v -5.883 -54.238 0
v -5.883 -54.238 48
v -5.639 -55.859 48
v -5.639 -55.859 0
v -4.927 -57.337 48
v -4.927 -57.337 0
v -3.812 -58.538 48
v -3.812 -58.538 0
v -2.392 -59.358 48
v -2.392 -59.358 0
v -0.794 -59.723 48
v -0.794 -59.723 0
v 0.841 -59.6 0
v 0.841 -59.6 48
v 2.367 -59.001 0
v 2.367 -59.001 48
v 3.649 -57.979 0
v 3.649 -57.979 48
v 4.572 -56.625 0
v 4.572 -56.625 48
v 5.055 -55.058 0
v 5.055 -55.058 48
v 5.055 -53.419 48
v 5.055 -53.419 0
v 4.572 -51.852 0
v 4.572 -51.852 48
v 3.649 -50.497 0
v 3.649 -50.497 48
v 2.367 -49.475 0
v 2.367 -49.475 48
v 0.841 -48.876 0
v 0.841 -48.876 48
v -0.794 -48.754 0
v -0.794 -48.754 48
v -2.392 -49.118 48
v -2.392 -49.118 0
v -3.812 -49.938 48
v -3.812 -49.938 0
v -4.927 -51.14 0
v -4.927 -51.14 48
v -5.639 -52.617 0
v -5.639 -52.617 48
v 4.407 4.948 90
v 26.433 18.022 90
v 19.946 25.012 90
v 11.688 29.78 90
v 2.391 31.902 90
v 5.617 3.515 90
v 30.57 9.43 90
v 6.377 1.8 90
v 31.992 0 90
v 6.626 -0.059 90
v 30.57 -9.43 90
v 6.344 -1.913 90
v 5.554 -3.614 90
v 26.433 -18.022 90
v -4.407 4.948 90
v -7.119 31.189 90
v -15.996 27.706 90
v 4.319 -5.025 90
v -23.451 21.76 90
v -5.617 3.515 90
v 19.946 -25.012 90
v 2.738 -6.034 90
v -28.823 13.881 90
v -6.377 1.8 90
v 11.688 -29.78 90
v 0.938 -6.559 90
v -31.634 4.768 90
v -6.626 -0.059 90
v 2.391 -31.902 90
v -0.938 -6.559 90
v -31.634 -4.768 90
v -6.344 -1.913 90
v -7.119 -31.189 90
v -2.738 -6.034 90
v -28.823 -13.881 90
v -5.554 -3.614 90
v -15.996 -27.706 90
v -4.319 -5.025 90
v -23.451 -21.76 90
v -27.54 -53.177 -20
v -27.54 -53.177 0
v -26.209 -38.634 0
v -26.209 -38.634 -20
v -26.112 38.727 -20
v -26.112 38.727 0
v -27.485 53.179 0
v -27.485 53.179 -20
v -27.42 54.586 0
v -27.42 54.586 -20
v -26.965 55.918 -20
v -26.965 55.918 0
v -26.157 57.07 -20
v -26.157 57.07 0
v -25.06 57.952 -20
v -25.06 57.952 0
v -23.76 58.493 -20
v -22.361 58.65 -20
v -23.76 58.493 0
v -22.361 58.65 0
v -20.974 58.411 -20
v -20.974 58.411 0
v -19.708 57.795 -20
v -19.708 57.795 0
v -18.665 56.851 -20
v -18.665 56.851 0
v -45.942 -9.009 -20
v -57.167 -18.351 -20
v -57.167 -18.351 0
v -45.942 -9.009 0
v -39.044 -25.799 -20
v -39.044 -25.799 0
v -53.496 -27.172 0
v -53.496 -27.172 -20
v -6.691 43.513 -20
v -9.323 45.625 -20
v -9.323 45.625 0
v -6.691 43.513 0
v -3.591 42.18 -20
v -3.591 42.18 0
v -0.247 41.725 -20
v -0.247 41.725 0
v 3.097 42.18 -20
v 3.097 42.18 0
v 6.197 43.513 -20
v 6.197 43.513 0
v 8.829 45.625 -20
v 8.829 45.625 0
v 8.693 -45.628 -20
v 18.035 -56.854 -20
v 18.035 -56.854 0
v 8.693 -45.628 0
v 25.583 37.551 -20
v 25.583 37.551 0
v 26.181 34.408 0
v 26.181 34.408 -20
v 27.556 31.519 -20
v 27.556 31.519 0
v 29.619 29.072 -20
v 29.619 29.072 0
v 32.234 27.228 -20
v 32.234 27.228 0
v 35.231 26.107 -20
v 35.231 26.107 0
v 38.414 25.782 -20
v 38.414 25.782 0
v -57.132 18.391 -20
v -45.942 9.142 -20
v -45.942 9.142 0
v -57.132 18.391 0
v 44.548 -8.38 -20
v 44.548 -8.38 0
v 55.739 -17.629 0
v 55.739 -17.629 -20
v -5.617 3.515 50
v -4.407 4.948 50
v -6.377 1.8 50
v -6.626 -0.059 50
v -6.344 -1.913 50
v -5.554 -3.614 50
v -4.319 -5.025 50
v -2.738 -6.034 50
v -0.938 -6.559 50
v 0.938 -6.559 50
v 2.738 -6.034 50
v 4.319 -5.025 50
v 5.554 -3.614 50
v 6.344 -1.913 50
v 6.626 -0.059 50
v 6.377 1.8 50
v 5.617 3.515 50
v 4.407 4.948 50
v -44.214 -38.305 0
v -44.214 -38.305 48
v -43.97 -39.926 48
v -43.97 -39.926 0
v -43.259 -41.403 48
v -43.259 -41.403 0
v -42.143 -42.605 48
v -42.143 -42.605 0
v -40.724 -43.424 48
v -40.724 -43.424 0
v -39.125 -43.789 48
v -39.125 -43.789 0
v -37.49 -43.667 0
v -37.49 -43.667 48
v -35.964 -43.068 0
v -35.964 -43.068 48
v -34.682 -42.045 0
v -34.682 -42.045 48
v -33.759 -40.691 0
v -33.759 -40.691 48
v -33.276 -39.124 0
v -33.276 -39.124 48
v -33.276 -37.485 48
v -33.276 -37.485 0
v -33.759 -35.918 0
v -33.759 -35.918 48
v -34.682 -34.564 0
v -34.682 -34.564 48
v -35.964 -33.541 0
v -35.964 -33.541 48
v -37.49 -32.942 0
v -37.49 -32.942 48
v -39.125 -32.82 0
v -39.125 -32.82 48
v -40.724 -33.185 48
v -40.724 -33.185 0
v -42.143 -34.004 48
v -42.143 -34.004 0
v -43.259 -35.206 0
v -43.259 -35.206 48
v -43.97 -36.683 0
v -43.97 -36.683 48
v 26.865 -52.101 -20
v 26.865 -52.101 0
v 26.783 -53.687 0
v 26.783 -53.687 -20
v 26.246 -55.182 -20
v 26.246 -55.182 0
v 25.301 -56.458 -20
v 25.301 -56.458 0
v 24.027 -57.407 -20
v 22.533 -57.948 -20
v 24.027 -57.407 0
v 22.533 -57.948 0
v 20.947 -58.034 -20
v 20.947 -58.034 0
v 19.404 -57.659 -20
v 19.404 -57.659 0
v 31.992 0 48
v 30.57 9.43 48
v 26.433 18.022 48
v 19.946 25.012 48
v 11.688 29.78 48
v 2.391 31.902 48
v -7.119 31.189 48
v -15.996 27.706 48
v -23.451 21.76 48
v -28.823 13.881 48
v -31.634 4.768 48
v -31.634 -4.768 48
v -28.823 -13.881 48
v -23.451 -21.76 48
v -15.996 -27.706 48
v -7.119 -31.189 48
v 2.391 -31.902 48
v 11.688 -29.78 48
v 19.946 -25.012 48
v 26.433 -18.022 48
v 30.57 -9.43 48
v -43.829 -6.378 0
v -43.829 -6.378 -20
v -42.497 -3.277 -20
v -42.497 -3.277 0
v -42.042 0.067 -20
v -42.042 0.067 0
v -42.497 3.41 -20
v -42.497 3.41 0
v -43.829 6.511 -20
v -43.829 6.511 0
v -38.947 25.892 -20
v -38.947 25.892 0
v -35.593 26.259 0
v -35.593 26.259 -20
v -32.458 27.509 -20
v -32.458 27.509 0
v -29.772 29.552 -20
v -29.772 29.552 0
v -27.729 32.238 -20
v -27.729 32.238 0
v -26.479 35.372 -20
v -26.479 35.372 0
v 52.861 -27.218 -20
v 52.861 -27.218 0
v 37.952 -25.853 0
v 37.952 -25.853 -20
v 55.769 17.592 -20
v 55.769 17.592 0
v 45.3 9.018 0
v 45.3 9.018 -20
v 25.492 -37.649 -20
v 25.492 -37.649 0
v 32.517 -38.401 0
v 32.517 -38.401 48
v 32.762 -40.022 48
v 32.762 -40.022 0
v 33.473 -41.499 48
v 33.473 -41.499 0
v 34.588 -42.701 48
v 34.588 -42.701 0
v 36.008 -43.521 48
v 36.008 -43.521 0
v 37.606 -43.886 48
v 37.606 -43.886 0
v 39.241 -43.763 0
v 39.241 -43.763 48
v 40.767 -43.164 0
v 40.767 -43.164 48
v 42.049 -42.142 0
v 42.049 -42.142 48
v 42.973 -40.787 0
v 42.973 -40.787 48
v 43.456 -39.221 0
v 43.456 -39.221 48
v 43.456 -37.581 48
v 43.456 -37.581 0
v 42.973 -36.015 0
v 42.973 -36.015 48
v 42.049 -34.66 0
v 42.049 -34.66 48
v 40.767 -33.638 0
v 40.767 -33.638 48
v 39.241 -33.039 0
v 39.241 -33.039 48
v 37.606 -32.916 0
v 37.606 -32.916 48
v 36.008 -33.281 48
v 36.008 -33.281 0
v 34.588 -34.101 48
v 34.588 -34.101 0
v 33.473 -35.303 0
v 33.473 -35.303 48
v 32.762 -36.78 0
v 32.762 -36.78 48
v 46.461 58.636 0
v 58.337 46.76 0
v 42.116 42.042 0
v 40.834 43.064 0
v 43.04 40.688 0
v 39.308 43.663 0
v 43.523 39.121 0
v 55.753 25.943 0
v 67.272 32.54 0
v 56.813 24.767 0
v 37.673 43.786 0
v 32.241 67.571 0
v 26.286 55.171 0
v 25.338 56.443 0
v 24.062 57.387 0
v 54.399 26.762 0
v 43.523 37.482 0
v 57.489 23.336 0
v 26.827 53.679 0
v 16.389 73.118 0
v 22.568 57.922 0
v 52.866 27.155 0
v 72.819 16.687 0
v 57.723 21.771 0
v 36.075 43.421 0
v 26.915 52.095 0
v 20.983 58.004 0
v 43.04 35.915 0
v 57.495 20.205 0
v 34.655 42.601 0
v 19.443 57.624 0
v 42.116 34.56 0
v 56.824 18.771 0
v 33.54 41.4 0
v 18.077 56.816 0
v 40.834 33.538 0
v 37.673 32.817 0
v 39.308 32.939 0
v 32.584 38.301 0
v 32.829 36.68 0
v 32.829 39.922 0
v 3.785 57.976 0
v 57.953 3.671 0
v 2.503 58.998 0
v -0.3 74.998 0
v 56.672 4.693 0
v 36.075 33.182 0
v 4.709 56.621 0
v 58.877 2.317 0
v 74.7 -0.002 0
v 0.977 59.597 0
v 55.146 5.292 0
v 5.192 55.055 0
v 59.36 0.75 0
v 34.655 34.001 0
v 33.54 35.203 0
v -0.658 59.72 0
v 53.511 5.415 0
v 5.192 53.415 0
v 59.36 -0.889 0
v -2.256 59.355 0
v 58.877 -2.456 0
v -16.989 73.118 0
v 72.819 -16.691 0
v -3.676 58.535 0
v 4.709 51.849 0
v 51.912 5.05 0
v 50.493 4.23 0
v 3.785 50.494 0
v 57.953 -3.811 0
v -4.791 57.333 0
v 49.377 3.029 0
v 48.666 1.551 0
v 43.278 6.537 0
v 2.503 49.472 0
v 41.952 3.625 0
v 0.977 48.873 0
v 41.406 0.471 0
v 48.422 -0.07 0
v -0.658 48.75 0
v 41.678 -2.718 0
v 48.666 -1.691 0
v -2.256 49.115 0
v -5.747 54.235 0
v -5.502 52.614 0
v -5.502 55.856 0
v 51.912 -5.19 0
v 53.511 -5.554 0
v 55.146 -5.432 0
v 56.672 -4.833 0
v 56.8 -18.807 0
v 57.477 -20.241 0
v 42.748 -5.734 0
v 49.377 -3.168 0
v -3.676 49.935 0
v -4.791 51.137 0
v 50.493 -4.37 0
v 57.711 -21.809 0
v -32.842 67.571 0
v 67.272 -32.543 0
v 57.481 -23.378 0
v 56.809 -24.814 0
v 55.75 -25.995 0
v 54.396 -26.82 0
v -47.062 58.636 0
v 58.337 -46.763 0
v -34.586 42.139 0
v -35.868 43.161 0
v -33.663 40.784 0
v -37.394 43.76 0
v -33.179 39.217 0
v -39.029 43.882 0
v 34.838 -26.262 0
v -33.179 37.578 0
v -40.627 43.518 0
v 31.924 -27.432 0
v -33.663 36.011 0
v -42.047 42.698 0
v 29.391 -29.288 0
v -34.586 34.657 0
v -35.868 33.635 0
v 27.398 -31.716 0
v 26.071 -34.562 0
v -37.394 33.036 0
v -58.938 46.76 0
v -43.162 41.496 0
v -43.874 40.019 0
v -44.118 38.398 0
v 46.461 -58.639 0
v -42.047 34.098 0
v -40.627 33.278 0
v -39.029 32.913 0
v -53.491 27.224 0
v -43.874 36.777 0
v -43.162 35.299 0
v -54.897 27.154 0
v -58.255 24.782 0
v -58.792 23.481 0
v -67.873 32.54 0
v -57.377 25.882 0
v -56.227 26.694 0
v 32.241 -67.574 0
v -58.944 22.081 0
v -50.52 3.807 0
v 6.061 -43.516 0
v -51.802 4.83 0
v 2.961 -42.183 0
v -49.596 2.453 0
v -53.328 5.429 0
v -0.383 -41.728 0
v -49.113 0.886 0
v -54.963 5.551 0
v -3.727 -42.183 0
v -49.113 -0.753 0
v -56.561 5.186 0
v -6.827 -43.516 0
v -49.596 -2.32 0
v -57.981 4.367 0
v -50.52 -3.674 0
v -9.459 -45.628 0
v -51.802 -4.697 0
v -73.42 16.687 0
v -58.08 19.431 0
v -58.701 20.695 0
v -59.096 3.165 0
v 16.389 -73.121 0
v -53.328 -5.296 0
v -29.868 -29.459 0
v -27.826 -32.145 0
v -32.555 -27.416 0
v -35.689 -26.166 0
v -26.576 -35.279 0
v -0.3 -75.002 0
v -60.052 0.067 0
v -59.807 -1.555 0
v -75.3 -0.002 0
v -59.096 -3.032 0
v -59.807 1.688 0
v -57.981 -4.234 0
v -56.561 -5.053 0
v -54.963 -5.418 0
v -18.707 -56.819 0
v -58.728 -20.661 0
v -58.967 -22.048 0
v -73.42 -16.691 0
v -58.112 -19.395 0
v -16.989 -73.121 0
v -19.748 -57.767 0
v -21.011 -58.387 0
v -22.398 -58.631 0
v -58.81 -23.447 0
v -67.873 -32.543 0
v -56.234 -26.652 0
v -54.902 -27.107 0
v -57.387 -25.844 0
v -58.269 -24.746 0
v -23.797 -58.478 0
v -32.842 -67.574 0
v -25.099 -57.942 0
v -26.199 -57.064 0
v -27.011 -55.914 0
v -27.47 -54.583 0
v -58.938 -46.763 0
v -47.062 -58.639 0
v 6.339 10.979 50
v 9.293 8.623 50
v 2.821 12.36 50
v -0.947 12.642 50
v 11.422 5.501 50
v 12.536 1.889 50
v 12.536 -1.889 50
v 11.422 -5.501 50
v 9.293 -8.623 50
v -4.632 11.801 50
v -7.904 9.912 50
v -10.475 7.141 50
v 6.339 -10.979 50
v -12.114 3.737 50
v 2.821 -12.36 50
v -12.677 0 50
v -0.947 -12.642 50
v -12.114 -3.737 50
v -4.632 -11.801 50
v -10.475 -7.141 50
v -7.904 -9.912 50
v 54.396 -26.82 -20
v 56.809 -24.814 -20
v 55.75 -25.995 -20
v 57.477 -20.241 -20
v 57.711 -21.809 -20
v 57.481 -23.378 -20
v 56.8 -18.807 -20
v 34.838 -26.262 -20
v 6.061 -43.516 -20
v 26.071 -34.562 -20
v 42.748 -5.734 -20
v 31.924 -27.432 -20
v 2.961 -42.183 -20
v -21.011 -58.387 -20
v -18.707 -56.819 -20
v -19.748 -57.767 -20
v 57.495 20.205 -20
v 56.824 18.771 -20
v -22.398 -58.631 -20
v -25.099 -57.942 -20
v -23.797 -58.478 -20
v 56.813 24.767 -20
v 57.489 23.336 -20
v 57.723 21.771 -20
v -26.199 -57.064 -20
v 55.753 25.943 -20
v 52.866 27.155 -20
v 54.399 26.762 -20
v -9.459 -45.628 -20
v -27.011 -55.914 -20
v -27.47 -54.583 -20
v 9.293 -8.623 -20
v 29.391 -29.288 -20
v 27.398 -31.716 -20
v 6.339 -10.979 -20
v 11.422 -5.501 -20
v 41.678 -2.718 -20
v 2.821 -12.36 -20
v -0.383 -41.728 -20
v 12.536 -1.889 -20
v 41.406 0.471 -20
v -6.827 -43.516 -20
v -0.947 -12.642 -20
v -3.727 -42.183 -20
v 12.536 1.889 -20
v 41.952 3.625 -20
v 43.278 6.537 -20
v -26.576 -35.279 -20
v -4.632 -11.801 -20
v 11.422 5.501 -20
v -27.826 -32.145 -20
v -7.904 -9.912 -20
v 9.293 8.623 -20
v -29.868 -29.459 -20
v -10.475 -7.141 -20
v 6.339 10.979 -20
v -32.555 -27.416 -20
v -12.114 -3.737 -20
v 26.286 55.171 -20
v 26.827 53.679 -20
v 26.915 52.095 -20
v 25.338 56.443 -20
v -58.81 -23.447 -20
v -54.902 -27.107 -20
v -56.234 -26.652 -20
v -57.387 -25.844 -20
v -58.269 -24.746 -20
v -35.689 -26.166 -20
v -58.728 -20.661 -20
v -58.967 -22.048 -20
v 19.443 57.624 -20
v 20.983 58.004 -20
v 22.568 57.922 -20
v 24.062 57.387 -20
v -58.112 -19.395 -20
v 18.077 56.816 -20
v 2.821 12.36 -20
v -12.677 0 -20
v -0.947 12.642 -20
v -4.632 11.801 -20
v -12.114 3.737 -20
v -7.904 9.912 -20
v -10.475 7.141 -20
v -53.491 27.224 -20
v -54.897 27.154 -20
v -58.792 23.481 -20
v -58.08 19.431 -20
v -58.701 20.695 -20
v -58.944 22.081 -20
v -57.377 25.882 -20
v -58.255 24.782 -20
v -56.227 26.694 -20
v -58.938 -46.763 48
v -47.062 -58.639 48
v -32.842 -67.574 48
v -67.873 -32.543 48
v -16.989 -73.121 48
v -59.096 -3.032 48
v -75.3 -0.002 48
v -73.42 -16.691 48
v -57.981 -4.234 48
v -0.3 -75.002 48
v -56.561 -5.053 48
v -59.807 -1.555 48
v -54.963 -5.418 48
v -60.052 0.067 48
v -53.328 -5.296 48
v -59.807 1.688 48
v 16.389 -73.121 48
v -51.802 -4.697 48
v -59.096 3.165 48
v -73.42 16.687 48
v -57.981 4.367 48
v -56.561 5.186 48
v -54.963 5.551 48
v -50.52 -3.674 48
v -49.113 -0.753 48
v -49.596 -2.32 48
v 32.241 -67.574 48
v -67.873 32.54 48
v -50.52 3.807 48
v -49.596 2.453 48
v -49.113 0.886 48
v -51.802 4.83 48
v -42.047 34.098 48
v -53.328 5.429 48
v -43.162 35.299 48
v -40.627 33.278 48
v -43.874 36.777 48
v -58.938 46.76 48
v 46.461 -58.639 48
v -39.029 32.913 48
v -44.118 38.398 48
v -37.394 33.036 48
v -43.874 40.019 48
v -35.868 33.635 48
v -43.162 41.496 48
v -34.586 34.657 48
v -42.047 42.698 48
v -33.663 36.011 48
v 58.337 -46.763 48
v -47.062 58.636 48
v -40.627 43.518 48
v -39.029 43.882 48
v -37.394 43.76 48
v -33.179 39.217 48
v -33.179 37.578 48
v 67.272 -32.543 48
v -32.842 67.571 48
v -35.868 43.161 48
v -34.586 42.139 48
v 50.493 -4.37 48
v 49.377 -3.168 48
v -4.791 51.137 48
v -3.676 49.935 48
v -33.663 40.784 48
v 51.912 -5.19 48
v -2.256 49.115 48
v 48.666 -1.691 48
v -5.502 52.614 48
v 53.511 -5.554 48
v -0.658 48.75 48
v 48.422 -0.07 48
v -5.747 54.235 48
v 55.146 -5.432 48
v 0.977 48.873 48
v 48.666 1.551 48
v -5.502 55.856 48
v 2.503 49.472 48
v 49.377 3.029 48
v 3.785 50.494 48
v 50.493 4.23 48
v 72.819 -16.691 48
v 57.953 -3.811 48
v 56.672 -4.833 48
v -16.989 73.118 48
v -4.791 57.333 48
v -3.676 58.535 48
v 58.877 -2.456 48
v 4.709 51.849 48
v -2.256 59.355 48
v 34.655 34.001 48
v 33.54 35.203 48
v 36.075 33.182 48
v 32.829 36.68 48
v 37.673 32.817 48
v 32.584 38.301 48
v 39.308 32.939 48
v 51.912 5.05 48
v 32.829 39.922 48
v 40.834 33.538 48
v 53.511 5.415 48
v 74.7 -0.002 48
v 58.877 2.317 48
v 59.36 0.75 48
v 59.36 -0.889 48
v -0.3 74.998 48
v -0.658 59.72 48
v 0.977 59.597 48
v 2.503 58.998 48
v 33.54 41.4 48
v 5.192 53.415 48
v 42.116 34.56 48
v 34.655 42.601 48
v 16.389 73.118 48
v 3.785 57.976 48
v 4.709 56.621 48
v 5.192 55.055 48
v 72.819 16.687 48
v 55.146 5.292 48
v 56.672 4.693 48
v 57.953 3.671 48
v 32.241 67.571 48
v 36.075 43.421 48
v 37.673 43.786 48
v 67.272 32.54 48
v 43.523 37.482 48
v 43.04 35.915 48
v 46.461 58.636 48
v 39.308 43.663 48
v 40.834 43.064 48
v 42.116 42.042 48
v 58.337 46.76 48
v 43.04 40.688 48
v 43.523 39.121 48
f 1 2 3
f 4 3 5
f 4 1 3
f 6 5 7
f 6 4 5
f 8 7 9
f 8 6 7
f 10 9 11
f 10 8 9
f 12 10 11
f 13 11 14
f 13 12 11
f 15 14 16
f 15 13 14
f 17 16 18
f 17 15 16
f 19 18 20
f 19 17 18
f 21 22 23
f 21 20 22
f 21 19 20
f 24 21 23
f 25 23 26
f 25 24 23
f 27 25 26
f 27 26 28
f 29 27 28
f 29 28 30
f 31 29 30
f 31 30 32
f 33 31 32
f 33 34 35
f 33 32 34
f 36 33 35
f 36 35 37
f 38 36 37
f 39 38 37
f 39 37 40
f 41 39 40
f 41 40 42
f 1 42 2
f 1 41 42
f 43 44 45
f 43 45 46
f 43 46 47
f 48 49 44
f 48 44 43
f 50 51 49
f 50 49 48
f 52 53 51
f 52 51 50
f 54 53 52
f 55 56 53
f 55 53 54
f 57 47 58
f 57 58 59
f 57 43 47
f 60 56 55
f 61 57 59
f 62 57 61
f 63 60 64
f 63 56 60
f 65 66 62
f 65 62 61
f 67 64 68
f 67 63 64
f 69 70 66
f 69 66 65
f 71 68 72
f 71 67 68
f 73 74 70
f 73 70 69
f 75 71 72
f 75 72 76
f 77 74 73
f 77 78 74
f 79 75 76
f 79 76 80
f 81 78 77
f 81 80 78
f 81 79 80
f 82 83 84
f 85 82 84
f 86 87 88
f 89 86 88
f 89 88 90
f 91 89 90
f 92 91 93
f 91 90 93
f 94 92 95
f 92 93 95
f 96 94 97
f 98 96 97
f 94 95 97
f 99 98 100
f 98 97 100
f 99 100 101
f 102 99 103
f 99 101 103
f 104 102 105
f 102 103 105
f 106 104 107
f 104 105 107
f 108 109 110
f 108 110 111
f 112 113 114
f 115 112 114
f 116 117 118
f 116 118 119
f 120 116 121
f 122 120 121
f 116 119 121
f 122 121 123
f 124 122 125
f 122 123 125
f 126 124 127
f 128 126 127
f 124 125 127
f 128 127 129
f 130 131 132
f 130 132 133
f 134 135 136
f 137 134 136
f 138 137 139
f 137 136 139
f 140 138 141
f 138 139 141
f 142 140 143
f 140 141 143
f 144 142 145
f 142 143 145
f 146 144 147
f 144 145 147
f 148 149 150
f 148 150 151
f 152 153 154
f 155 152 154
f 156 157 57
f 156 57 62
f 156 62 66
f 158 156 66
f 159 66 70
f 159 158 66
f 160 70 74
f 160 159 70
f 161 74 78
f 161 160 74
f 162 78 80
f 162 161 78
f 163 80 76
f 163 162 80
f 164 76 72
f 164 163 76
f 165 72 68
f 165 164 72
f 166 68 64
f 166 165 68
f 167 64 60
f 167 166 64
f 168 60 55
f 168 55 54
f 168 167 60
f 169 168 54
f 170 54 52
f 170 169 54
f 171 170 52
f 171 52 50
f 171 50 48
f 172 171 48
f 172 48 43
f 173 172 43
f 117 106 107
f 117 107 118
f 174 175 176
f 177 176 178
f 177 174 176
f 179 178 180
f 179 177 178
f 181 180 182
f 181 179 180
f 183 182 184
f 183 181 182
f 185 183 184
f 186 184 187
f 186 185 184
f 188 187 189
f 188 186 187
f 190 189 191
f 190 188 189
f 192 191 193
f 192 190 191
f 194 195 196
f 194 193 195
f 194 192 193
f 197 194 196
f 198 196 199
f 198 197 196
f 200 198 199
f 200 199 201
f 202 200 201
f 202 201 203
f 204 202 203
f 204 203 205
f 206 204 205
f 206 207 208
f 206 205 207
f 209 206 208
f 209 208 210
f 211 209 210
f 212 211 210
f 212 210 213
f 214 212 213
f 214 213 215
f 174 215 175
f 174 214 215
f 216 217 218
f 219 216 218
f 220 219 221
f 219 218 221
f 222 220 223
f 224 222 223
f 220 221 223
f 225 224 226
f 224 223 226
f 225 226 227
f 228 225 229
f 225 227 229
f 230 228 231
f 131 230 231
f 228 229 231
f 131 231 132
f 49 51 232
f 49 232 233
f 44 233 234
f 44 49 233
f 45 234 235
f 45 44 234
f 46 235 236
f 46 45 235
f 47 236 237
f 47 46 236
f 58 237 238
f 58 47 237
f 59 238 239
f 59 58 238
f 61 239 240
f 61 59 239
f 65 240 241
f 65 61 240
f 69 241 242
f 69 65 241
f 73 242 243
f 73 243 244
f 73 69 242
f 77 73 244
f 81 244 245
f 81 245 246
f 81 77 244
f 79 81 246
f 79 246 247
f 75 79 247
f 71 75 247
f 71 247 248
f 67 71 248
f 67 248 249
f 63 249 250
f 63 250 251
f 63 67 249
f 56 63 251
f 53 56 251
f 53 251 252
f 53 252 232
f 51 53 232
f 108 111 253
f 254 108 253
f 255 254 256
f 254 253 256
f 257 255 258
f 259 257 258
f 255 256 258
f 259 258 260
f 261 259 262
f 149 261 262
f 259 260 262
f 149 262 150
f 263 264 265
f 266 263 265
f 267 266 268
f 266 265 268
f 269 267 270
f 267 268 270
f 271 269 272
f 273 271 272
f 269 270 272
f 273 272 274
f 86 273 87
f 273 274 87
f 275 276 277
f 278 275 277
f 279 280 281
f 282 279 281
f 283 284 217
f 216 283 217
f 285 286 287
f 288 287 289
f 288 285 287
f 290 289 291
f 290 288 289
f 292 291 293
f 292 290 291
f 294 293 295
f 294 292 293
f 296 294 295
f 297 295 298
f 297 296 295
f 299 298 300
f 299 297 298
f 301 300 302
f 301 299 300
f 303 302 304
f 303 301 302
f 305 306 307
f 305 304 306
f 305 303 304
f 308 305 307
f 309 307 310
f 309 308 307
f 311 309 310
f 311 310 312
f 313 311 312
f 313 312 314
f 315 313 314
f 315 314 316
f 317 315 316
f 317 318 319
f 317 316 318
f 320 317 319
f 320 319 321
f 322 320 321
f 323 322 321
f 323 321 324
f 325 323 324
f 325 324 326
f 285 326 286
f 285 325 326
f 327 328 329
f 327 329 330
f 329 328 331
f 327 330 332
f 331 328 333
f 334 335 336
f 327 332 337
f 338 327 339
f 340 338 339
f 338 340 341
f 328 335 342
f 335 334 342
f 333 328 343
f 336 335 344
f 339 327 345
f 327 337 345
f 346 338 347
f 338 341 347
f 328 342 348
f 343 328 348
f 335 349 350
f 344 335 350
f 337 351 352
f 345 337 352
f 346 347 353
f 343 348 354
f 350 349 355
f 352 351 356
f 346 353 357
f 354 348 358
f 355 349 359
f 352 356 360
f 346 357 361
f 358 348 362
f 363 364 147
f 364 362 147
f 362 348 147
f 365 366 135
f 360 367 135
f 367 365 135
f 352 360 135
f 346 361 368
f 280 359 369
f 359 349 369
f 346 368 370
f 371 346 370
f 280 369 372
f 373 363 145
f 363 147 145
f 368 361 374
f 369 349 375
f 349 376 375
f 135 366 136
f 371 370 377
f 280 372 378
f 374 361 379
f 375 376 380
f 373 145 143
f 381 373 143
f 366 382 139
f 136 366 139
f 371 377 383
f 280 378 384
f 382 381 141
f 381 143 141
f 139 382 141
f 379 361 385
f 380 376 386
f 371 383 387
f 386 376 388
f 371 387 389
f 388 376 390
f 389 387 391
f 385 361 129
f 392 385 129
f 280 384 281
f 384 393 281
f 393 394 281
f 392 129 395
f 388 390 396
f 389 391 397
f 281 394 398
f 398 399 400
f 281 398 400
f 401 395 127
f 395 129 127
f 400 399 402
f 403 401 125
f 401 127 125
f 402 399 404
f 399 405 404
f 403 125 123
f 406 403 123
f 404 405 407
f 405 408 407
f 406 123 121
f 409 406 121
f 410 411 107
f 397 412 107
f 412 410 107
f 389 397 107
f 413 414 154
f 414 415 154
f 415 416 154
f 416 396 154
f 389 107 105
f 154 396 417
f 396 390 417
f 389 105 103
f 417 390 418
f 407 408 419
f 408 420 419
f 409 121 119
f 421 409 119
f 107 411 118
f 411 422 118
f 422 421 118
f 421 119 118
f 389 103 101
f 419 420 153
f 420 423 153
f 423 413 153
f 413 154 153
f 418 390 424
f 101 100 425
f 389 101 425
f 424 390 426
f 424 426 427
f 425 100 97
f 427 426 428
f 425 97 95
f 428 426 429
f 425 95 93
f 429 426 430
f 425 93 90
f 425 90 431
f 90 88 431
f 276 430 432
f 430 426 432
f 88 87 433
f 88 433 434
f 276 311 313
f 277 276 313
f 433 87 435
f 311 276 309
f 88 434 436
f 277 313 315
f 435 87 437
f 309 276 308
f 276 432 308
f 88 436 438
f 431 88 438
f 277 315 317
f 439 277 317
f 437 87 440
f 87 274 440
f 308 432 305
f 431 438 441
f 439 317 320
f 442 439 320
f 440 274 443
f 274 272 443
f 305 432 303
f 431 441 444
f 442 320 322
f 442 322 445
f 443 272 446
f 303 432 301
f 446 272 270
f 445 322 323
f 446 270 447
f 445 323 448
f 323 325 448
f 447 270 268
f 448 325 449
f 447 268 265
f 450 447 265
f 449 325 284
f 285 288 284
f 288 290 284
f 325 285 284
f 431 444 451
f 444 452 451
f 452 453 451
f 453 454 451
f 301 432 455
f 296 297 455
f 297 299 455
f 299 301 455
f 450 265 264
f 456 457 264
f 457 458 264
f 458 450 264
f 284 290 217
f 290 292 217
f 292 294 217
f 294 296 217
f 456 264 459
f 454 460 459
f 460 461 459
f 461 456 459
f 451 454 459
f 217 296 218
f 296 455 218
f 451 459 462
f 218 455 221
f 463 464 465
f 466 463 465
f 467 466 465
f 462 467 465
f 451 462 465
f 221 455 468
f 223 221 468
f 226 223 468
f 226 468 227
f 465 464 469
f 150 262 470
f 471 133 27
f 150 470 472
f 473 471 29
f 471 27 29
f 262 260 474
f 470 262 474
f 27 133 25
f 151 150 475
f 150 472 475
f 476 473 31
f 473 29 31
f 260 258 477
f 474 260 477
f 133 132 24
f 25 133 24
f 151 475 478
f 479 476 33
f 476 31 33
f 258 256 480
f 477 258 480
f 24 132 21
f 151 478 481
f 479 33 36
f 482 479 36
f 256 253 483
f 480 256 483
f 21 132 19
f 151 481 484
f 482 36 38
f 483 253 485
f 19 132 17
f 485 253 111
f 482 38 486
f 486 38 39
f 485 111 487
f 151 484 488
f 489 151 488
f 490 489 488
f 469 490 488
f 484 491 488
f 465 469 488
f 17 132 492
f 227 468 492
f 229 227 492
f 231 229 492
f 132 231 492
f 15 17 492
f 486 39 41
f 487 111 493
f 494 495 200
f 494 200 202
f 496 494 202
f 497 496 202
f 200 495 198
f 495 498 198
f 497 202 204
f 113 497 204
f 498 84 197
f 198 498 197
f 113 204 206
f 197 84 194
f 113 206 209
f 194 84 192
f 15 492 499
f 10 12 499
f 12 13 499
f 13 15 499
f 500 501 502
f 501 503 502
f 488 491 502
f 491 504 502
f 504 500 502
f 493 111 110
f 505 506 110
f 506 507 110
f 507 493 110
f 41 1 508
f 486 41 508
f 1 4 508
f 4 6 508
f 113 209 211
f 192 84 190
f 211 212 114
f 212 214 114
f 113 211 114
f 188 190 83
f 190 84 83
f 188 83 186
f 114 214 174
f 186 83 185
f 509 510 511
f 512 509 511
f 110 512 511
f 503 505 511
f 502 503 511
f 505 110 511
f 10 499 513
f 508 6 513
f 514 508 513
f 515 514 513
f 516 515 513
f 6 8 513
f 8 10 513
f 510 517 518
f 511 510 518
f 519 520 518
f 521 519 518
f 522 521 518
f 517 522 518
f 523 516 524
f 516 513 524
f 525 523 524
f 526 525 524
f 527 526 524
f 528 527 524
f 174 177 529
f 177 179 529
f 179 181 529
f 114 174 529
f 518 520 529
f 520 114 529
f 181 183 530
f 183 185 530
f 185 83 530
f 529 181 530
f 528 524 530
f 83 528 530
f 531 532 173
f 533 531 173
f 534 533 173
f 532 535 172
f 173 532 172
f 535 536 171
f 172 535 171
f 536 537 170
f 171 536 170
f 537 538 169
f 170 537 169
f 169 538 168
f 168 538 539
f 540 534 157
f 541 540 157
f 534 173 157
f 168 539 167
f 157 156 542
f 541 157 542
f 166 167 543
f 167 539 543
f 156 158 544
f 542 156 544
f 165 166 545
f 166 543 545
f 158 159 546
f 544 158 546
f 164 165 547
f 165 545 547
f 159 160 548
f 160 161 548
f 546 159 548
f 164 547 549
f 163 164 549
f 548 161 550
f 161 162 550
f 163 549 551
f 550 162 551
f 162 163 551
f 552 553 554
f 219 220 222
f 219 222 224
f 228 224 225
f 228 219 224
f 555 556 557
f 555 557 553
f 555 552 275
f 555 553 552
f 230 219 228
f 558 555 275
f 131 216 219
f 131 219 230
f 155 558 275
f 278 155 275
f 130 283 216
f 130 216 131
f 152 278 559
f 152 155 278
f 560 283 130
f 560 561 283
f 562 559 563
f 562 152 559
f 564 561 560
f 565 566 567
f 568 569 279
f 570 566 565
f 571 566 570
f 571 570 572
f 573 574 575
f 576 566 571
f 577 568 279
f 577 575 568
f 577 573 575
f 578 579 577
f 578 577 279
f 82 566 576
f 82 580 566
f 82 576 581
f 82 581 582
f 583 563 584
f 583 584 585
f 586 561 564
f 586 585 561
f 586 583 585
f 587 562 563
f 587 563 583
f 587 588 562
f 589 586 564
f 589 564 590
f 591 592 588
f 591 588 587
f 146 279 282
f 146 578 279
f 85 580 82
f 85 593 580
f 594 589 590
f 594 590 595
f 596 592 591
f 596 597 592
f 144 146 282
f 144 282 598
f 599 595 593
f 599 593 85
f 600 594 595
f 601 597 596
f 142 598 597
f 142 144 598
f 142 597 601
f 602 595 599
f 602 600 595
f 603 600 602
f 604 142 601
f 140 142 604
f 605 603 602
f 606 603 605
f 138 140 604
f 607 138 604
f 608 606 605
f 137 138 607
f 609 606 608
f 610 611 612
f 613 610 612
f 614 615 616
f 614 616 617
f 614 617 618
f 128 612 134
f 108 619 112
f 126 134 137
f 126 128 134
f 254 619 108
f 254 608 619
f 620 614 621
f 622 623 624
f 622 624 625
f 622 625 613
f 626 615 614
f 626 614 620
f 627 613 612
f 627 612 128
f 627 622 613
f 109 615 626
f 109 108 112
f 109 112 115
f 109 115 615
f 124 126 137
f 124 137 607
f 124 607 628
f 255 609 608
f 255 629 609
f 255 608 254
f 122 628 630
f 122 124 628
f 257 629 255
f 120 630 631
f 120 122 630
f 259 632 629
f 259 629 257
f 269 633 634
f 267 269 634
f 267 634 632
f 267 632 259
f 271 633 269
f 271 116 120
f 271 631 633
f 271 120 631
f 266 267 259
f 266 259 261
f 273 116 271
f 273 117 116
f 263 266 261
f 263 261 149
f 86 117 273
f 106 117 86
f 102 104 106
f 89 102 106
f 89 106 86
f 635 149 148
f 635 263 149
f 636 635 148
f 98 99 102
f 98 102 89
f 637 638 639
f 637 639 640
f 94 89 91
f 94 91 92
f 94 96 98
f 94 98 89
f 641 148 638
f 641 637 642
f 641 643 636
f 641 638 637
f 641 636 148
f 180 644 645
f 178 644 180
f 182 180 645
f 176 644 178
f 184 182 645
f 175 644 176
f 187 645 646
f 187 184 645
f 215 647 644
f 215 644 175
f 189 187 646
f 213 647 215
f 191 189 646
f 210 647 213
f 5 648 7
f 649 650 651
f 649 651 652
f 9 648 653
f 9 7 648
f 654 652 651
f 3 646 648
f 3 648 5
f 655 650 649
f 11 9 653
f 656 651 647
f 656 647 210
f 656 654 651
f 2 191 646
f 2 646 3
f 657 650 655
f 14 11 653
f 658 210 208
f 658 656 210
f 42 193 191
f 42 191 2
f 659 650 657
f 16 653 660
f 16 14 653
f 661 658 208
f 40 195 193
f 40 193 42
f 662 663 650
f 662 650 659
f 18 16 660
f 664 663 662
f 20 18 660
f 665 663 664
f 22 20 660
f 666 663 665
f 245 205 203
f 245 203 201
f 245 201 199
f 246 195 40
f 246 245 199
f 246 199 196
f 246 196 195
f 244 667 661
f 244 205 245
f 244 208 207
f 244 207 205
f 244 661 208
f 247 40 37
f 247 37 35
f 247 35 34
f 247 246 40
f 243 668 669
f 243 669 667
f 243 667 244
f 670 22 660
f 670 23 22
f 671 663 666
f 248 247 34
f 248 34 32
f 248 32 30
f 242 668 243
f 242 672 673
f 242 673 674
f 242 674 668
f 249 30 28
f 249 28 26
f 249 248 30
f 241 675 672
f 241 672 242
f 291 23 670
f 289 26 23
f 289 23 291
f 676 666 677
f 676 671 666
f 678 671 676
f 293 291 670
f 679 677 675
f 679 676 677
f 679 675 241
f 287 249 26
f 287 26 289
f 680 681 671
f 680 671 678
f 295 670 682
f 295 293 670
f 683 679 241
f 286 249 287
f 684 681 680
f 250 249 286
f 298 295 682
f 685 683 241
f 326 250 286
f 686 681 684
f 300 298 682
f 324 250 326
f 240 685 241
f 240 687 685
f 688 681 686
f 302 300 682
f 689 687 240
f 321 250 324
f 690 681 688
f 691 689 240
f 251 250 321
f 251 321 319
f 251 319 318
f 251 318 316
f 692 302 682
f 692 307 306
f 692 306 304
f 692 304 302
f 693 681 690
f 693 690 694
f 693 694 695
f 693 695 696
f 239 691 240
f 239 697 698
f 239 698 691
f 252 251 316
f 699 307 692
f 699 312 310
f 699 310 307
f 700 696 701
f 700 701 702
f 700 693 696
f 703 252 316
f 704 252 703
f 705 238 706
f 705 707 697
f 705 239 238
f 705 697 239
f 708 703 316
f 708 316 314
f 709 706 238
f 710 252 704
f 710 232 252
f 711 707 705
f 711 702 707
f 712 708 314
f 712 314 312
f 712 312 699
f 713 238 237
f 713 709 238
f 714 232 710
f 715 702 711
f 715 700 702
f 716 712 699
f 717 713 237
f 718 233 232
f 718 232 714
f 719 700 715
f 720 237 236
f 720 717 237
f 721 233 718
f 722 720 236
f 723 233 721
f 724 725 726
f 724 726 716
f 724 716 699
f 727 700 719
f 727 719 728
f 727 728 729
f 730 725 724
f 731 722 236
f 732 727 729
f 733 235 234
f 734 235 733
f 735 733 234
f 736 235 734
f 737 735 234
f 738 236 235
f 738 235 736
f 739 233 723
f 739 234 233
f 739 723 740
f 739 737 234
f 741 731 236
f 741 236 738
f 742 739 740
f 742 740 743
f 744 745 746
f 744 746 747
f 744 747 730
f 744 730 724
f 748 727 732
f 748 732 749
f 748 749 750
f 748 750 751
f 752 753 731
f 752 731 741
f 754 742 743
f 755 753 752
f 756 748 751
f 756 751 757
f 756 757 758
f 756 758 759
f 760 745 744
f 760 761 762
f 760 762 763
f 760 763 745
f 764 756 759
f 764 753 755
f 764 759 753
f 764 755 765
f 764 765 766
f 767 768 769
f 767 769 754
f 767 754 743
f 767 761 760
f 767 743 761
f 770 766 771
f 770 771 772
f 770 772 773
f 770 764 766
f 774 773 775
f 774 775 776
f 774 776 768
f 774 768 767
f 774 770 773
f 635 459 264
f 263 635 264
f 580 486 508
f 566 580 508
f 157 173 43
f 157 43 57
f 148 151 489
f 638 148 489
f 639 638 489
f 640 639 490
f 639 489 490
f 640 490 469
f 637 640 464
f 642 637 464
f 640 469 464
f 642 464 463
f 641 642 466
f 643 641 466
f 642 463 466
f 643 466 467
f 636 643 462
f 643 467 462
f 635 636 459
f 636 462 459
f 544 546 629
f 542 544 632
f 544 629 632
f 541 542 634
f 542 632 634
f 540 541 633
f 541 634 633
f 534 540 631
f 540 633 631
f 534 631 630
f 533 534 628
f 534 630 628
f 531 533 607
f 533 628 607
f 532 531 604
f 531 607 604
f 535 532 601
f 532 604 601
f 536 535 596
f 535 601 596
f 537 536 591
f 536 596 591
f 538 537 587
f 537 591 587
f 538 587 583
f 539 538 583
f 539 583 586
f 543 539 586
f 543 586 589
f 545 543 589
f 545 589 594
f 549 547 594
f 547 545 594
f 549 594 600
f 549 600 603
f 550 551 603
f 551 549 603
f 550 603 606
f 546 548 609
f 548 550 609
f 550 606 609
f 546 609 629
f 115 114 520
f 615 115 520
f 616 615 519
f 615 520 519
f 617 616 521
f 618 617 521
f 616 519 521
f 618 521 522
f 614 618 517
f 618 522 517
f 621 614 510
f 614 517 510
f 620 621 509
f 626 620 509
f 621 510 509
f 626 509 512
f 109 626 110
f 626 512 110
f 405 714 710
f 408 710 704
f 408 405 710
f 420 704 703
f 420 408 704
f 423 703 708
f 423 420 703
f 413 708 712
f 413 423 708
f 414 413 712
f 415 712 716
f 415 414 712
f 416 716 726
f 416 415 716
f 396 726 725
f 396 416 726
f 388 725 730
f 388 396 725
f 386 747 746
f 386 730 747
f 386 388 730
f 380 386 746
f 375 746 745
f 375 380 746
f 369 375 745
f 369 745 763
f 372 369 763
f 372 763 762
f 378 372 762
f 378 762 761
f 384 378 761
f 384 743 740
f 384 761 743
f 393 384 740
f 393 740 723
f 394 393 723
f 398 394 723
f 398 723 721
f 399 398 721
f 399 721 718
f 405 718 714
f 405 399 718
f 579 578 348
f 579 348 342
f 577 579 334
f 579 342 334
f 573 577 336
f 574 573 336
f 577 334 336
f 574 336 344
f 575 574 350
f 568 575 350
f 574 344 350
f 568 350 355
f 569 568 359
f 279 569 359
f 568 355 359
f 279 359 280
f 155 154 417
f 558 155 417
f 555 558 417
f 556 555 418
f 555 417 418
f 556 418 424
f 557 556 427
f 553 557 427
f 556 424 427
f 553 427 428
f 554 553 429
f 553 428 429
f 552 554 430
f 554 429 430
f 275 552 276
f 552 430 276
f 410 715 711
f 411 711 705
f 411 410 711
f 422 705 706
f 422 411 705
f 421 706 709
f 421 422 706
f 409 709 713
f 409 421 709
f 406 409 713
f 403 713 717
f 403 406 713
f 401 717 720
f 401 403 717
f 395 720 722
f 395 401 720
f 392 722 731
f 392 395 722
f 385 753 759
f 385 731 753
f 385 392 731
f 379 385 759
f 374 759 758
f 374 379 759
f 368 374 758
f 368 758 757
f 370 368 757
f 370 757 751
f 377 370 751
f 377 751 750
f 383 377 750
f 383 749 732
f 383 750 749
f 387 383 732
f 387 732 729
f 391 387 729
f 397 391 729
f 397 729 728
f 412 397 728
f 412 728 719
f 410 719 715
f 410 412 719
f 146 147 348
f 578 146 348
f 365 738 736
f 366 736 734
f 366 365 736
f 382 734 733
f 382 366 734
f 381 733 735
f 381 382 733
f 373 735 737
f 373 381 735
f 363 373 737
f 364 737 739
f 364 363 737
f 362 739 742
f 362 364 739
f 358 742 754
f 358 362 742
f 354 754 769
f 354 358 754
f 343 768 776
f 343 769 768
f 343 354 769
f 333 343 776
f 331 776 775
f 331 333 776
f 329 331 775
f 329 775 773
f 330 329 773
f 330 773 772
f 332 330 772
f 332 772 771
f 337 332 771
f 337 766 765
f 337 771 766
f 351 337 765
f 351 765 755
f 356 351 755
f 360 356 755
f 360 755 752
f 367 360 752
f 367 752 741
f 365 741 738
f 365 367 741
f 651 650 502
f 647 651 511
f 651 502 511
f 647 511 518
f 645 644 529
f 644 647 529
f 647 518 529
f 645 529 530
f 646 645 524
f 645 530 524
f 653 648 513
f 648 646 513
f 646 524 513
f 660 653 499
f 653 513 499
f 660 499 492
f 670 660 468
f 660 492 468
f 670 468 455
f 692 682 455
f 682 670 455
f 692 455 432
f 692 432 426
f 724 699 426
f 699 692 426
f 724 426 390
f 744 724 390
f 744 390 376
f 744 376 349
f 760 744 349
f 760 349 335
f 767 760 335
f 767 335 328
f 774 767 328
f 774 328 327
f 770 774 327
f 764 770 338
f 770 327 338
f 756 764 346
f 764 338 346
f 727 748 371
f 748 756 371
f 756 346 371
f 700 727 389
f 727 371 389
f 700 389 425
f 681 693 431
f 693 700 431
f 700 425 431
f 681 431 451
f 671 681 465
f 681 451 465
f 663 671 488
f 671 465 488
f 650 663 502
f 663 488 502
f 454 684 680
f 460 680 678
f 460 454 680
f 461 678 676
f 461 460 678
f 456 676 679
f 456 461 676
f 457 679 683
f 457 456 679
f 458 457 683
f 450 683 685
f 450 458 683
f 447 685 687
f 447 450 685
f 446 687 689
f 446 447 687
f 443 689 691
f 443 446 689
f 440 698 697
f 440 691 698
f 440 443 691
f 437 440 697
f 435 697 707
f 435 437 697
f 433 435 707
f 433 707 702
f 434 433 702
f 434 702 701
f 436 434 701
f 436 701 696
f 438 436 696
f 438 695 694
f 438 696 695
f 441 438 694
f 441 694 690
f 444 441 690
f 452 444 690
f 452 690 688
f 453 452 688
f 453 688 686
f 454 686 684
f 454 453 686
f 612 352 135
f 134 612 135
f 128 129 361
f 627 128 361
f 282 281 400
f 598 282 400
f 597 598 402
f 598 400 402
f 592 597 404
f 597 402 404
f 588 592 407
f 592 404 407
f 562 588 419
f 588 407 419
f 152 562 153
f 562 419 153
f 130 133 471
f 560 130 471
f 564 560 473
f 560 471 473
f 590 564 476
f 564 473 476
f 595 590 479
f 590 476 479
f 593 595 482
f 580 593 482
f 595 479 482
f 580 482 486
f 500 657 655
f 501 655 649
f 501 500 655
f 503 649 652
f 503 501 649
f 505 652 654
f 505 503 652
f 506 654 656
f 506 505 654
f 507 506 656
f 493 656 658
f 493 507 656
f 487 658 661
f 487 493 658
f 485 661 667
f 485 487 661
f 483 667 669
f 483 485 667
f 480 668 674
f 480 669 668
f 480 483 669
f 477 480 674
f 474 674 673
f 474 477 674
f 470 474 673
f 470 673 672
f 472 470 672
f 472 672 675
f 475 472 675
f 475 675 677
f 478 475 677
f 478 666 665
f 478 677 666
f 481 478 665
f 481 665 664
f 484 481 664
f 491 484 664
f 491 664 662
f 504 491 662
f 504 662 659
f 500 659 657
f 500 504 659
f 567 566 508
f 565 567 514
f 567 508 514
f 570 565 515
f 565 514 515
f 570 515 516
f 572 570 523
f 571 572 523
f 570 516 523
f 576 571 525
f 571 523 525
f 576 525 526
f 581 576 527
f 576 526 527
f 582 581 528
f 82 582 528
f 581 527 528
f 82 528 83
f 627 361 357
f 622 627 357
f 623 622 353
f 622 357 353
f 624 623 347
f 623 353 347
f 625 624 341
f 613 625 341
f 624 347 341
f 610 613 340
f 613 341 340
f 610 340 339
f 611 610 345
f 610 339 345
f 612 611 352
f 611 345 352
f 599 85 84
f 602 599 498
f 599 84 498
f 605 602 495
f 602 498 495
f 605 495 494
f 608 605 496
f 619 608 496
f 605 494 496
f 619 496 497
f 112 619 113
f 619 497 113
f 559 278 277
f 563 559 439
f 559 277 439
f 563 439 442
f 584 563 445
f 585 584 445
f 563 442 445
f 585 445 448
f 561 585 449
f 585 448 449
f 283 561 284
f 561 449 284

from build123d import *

# Parameters (mm, degrees)
CROQUIS1_R              = 75
CROQUIS1_R_2            = 5.5
SALIENTE_EXTRUIR2_DEPTH = 90
SALIENTE_EXTRUIR3_DEPTH = 20
CROQUIS3_R              = 12.677450178
CORTAR_EXTRUIR1_DEPTH   = 110
CROQUIS7_R              = 86.720907706
CROQUIS7_R_2            = 31.991589163
CORTAR_EXTRUIR6_DEPTH   = 42
SALIENTE_EXTRUIR5_START = -40
CROQUIS8_R              = 12.677450178
SALIENTE_EXTRUIR5_DEPTH = 40


with BuildPart() as part:
    # Croquis1 → Saliente-Extruir2 (new body)
    with BuildSketch(Plane.XY):
        with Locations(Location((-0.300298633, -0.001591846, 0), (0, 0, 180))):
            Circle(CROQUIS1_R)
        with Locations(Location((38.084343476, 38.301334696, 0), (0, 0, 180))):
            Circle(CROQUIS1_R_2, mode=Mode.SUBTRACT)
        with Locations(Location((53.921710963, -0.069731009, 0), (0, 0, 180))):
            Circle(CROQUIS1_R_2, mode=Mode.SUBTRACT)
        with Locations(Location((38.017275671, -38.400881717, 0), (0, 0, 180))):
            Circle(CROQUIS1_R_2, mode=Mode.SUBTRACT)
        with Locations(Location((-0.383085558, -54.238249204, 0), (0, 0, 180))):
            Circle(CROQUIS1_R_2, mode=Mode.SUBTRACT)
        with Locations(Location((-38.714236265, -38.304518389, 0), (0, 0, 180))):
            Circle(CROQUIS1_R_2, mode=Mode.SUBTRACT)
        with Locations(Location((-54.551603752, 0.066547317, 0), (0, 0, 180))):
            Circle(CROQUIS1_R_2, mode=Mode.SUBTRACT)
        with Locations(Location((-38.617872937, 38.397698024, 0), (0, 0, 180))):
            Circle(CROQUIS1_R_2, mode=Mode.SUBTRACT)
        with Locations(Location((-0.246807232, 54.235065511, 0), (0, 0, 180))):
            Circle(CROQUIS1_R_2, mode=Mode.SUBTRACT)
    extrude(amount=SALIENTE_EXTRUIR2_DEPTH)

    # Croquis2 → Saliente-Extruir3 (add)
    with BuildSketch(Plane(origin=(0, 0, 0), x_dir=(-1, 0, 0), z_dir=(0, 0, -1))):
        with BuildLine():
            Line((26.112208604, 38.727030057), (27.485456967, 53.179425602))
            ThreePointArc((27.485456967, 53.179425602), (24.429171845, 58.268515598), (18.664650888, 56.850766019))
            Line((18.664650888, 56.850766019), (9.322520199, 45.625098372))
            ThreePointArc((9.322520199, 45.625098372), (0.246807232, 41.725065511), (-8.828905735, 45.625098372))
            Line((-8.828905735, 45.625098372), (-18.077259399, 56.815518496))
            ThreePointArc((-18.077259399, 56.815518496), (-24.061995546, 57.38682812), (-26.914903807, 52.094912031))
            Line((-26.914903807, 52.094912031), (-25.583042051, 37.551282353))
            ThreePointArc((-25.583042051, 37.551282353), (-29.618728772, 29.072115687), (-38.414038327, 25.78189313))
            Line((-38.414038327, 25.78189313), (-52.866433872, 27.155141493))
            ThreePointArc((-52.866433872, 27.155141493), (-57.489082017, 23.336218016), (-55.768515975, 17.592290361))
            Line((-55.768515975, 17.592290361), (-45.299902018, 9.018464332))
            ThreePointArc((-45.299902018, 9.018464332), (-41.406181734, 0.471020463), (-44.548158548, -8.380410835))
            Line((-44.548158548, -8.380410835), (-55.738578672, -17.628764499))
            ThreePointArc((-55.738578672, -17.628764499), (-57.481280164, -23.378316923), (-52.860896821, -27.218423606))
            Line((-52.860896821, -27.218423606), (-37.951986277, -25.85311053))
            ThreePointArc((-37.951986277, -25.85311053), (-29.390923032, -29.288425153), (-25.491911386, -37.648502822))
            Line((-25.491911386, -37.648502822), (-26.86515975, -52.100898367))
            ThreePointArc((-26.86515975, -52.100898367), (-24.027008592, -57.407327586), (-18.034758099, -56.853949712))
            Line((-18.034758099, -56.853949712), (-8.692627409, -45.628282064))
            ThreePointArc((-8.692627409, -45.628282064), (0.383085558, -41.728249204), (9.458798525, -45.628282064))
            Line((9.458798525, -45.628282064), (18.707152189, -56.818702189))
            ThreePointArc((18.707152189, -56.818702189), (24.46680217, -58.2561123), (27.540433688, -53.177480099))
            Line((27.540433688, -53.177480099), (26.208571932, -38.633850421))
            ThreePointArc((26.208571932, -38.633850421), (29.868330432, -29.458612556), (39.043568298, -25.798854055))
            Line((39.043568298, -25.798854055), (53.495963843, -27.172102419))
            ThreePointArc((53.495963843, -27.172102419), (58.58505384, -24.115817297), (57.16730426, -18.35129634))
            Line((57.16730426, -18.35129634), (45.941636613, -9.00916565))
            ThreePointArc((45.941636613, -9.00916565), (42.041603752, 0.066547317), (45.941636613, 9.142260284))
            Line((45.941636613, 9.142260284), (57.132056737, 18.390613948))
            ThreePointArc((57.132056737, 18.390613948), (58.569466849, 24.150263929), (53.490834648, 27.223895446))
            Line((53.490834648, 27.223895446), (38.94720497, 25.892033691))
            ThreePointArc((38.94720497, 25.892033691), (29.771967104, 29.551792191), (26.112208604, 38.727030057))
        make_face()
    extrude(amount=SALIENTE_EXTRUIR3_DEPTH)

    # Croquis3 → Cortar-Extruir1 (cut)
    with BuildSketch(Plane(origin=(0, 0, -20), x_dir=(-1, 0, 0), z_dir=(0, 0, -1))):
        Circle(CROQUIS3_R)
    extrude(amount=-CORTAR_EXTRUIR1_DEPTH, mode=Mode.SUBTRACT)

    # Croquis7 → Cortar-Extruir6 (cut)
    with BuildSketch(Plane.XY.offset(90)):
        Circle(CROQUIS7_R)
        Circle(CROQUIS7_R_2, mode=Mode.SUBTRACT)
    extrude(amount=-CORTAR_EXTRUIR6_DEPTH, mode=Mode.SUBTRACT)

    # Croquis8 → Saliente-Extruir5 (add)
    with BuildSketch(Plane.XY.offset(90).offset(SALIENTE_EXTRUIR5_START)):
        with Locations(Location((0, 0, 0), (0, 0, 180))):
            Circle(CROQUIS8_R)
        with BuildLine():
            Line((4.407319519, 4.947589036), (-4.407319519, 4.947589036))
            ThreePointArc((-4.407319519, 4.947589036), (0, -6.62594164), (4.407319519, 4.947589036))
        make_face(mode=Mode.SUBTRACT)
    extrude(amount=SALIENTE_EXTRUIR5_DEPTH)


solid = part.part
